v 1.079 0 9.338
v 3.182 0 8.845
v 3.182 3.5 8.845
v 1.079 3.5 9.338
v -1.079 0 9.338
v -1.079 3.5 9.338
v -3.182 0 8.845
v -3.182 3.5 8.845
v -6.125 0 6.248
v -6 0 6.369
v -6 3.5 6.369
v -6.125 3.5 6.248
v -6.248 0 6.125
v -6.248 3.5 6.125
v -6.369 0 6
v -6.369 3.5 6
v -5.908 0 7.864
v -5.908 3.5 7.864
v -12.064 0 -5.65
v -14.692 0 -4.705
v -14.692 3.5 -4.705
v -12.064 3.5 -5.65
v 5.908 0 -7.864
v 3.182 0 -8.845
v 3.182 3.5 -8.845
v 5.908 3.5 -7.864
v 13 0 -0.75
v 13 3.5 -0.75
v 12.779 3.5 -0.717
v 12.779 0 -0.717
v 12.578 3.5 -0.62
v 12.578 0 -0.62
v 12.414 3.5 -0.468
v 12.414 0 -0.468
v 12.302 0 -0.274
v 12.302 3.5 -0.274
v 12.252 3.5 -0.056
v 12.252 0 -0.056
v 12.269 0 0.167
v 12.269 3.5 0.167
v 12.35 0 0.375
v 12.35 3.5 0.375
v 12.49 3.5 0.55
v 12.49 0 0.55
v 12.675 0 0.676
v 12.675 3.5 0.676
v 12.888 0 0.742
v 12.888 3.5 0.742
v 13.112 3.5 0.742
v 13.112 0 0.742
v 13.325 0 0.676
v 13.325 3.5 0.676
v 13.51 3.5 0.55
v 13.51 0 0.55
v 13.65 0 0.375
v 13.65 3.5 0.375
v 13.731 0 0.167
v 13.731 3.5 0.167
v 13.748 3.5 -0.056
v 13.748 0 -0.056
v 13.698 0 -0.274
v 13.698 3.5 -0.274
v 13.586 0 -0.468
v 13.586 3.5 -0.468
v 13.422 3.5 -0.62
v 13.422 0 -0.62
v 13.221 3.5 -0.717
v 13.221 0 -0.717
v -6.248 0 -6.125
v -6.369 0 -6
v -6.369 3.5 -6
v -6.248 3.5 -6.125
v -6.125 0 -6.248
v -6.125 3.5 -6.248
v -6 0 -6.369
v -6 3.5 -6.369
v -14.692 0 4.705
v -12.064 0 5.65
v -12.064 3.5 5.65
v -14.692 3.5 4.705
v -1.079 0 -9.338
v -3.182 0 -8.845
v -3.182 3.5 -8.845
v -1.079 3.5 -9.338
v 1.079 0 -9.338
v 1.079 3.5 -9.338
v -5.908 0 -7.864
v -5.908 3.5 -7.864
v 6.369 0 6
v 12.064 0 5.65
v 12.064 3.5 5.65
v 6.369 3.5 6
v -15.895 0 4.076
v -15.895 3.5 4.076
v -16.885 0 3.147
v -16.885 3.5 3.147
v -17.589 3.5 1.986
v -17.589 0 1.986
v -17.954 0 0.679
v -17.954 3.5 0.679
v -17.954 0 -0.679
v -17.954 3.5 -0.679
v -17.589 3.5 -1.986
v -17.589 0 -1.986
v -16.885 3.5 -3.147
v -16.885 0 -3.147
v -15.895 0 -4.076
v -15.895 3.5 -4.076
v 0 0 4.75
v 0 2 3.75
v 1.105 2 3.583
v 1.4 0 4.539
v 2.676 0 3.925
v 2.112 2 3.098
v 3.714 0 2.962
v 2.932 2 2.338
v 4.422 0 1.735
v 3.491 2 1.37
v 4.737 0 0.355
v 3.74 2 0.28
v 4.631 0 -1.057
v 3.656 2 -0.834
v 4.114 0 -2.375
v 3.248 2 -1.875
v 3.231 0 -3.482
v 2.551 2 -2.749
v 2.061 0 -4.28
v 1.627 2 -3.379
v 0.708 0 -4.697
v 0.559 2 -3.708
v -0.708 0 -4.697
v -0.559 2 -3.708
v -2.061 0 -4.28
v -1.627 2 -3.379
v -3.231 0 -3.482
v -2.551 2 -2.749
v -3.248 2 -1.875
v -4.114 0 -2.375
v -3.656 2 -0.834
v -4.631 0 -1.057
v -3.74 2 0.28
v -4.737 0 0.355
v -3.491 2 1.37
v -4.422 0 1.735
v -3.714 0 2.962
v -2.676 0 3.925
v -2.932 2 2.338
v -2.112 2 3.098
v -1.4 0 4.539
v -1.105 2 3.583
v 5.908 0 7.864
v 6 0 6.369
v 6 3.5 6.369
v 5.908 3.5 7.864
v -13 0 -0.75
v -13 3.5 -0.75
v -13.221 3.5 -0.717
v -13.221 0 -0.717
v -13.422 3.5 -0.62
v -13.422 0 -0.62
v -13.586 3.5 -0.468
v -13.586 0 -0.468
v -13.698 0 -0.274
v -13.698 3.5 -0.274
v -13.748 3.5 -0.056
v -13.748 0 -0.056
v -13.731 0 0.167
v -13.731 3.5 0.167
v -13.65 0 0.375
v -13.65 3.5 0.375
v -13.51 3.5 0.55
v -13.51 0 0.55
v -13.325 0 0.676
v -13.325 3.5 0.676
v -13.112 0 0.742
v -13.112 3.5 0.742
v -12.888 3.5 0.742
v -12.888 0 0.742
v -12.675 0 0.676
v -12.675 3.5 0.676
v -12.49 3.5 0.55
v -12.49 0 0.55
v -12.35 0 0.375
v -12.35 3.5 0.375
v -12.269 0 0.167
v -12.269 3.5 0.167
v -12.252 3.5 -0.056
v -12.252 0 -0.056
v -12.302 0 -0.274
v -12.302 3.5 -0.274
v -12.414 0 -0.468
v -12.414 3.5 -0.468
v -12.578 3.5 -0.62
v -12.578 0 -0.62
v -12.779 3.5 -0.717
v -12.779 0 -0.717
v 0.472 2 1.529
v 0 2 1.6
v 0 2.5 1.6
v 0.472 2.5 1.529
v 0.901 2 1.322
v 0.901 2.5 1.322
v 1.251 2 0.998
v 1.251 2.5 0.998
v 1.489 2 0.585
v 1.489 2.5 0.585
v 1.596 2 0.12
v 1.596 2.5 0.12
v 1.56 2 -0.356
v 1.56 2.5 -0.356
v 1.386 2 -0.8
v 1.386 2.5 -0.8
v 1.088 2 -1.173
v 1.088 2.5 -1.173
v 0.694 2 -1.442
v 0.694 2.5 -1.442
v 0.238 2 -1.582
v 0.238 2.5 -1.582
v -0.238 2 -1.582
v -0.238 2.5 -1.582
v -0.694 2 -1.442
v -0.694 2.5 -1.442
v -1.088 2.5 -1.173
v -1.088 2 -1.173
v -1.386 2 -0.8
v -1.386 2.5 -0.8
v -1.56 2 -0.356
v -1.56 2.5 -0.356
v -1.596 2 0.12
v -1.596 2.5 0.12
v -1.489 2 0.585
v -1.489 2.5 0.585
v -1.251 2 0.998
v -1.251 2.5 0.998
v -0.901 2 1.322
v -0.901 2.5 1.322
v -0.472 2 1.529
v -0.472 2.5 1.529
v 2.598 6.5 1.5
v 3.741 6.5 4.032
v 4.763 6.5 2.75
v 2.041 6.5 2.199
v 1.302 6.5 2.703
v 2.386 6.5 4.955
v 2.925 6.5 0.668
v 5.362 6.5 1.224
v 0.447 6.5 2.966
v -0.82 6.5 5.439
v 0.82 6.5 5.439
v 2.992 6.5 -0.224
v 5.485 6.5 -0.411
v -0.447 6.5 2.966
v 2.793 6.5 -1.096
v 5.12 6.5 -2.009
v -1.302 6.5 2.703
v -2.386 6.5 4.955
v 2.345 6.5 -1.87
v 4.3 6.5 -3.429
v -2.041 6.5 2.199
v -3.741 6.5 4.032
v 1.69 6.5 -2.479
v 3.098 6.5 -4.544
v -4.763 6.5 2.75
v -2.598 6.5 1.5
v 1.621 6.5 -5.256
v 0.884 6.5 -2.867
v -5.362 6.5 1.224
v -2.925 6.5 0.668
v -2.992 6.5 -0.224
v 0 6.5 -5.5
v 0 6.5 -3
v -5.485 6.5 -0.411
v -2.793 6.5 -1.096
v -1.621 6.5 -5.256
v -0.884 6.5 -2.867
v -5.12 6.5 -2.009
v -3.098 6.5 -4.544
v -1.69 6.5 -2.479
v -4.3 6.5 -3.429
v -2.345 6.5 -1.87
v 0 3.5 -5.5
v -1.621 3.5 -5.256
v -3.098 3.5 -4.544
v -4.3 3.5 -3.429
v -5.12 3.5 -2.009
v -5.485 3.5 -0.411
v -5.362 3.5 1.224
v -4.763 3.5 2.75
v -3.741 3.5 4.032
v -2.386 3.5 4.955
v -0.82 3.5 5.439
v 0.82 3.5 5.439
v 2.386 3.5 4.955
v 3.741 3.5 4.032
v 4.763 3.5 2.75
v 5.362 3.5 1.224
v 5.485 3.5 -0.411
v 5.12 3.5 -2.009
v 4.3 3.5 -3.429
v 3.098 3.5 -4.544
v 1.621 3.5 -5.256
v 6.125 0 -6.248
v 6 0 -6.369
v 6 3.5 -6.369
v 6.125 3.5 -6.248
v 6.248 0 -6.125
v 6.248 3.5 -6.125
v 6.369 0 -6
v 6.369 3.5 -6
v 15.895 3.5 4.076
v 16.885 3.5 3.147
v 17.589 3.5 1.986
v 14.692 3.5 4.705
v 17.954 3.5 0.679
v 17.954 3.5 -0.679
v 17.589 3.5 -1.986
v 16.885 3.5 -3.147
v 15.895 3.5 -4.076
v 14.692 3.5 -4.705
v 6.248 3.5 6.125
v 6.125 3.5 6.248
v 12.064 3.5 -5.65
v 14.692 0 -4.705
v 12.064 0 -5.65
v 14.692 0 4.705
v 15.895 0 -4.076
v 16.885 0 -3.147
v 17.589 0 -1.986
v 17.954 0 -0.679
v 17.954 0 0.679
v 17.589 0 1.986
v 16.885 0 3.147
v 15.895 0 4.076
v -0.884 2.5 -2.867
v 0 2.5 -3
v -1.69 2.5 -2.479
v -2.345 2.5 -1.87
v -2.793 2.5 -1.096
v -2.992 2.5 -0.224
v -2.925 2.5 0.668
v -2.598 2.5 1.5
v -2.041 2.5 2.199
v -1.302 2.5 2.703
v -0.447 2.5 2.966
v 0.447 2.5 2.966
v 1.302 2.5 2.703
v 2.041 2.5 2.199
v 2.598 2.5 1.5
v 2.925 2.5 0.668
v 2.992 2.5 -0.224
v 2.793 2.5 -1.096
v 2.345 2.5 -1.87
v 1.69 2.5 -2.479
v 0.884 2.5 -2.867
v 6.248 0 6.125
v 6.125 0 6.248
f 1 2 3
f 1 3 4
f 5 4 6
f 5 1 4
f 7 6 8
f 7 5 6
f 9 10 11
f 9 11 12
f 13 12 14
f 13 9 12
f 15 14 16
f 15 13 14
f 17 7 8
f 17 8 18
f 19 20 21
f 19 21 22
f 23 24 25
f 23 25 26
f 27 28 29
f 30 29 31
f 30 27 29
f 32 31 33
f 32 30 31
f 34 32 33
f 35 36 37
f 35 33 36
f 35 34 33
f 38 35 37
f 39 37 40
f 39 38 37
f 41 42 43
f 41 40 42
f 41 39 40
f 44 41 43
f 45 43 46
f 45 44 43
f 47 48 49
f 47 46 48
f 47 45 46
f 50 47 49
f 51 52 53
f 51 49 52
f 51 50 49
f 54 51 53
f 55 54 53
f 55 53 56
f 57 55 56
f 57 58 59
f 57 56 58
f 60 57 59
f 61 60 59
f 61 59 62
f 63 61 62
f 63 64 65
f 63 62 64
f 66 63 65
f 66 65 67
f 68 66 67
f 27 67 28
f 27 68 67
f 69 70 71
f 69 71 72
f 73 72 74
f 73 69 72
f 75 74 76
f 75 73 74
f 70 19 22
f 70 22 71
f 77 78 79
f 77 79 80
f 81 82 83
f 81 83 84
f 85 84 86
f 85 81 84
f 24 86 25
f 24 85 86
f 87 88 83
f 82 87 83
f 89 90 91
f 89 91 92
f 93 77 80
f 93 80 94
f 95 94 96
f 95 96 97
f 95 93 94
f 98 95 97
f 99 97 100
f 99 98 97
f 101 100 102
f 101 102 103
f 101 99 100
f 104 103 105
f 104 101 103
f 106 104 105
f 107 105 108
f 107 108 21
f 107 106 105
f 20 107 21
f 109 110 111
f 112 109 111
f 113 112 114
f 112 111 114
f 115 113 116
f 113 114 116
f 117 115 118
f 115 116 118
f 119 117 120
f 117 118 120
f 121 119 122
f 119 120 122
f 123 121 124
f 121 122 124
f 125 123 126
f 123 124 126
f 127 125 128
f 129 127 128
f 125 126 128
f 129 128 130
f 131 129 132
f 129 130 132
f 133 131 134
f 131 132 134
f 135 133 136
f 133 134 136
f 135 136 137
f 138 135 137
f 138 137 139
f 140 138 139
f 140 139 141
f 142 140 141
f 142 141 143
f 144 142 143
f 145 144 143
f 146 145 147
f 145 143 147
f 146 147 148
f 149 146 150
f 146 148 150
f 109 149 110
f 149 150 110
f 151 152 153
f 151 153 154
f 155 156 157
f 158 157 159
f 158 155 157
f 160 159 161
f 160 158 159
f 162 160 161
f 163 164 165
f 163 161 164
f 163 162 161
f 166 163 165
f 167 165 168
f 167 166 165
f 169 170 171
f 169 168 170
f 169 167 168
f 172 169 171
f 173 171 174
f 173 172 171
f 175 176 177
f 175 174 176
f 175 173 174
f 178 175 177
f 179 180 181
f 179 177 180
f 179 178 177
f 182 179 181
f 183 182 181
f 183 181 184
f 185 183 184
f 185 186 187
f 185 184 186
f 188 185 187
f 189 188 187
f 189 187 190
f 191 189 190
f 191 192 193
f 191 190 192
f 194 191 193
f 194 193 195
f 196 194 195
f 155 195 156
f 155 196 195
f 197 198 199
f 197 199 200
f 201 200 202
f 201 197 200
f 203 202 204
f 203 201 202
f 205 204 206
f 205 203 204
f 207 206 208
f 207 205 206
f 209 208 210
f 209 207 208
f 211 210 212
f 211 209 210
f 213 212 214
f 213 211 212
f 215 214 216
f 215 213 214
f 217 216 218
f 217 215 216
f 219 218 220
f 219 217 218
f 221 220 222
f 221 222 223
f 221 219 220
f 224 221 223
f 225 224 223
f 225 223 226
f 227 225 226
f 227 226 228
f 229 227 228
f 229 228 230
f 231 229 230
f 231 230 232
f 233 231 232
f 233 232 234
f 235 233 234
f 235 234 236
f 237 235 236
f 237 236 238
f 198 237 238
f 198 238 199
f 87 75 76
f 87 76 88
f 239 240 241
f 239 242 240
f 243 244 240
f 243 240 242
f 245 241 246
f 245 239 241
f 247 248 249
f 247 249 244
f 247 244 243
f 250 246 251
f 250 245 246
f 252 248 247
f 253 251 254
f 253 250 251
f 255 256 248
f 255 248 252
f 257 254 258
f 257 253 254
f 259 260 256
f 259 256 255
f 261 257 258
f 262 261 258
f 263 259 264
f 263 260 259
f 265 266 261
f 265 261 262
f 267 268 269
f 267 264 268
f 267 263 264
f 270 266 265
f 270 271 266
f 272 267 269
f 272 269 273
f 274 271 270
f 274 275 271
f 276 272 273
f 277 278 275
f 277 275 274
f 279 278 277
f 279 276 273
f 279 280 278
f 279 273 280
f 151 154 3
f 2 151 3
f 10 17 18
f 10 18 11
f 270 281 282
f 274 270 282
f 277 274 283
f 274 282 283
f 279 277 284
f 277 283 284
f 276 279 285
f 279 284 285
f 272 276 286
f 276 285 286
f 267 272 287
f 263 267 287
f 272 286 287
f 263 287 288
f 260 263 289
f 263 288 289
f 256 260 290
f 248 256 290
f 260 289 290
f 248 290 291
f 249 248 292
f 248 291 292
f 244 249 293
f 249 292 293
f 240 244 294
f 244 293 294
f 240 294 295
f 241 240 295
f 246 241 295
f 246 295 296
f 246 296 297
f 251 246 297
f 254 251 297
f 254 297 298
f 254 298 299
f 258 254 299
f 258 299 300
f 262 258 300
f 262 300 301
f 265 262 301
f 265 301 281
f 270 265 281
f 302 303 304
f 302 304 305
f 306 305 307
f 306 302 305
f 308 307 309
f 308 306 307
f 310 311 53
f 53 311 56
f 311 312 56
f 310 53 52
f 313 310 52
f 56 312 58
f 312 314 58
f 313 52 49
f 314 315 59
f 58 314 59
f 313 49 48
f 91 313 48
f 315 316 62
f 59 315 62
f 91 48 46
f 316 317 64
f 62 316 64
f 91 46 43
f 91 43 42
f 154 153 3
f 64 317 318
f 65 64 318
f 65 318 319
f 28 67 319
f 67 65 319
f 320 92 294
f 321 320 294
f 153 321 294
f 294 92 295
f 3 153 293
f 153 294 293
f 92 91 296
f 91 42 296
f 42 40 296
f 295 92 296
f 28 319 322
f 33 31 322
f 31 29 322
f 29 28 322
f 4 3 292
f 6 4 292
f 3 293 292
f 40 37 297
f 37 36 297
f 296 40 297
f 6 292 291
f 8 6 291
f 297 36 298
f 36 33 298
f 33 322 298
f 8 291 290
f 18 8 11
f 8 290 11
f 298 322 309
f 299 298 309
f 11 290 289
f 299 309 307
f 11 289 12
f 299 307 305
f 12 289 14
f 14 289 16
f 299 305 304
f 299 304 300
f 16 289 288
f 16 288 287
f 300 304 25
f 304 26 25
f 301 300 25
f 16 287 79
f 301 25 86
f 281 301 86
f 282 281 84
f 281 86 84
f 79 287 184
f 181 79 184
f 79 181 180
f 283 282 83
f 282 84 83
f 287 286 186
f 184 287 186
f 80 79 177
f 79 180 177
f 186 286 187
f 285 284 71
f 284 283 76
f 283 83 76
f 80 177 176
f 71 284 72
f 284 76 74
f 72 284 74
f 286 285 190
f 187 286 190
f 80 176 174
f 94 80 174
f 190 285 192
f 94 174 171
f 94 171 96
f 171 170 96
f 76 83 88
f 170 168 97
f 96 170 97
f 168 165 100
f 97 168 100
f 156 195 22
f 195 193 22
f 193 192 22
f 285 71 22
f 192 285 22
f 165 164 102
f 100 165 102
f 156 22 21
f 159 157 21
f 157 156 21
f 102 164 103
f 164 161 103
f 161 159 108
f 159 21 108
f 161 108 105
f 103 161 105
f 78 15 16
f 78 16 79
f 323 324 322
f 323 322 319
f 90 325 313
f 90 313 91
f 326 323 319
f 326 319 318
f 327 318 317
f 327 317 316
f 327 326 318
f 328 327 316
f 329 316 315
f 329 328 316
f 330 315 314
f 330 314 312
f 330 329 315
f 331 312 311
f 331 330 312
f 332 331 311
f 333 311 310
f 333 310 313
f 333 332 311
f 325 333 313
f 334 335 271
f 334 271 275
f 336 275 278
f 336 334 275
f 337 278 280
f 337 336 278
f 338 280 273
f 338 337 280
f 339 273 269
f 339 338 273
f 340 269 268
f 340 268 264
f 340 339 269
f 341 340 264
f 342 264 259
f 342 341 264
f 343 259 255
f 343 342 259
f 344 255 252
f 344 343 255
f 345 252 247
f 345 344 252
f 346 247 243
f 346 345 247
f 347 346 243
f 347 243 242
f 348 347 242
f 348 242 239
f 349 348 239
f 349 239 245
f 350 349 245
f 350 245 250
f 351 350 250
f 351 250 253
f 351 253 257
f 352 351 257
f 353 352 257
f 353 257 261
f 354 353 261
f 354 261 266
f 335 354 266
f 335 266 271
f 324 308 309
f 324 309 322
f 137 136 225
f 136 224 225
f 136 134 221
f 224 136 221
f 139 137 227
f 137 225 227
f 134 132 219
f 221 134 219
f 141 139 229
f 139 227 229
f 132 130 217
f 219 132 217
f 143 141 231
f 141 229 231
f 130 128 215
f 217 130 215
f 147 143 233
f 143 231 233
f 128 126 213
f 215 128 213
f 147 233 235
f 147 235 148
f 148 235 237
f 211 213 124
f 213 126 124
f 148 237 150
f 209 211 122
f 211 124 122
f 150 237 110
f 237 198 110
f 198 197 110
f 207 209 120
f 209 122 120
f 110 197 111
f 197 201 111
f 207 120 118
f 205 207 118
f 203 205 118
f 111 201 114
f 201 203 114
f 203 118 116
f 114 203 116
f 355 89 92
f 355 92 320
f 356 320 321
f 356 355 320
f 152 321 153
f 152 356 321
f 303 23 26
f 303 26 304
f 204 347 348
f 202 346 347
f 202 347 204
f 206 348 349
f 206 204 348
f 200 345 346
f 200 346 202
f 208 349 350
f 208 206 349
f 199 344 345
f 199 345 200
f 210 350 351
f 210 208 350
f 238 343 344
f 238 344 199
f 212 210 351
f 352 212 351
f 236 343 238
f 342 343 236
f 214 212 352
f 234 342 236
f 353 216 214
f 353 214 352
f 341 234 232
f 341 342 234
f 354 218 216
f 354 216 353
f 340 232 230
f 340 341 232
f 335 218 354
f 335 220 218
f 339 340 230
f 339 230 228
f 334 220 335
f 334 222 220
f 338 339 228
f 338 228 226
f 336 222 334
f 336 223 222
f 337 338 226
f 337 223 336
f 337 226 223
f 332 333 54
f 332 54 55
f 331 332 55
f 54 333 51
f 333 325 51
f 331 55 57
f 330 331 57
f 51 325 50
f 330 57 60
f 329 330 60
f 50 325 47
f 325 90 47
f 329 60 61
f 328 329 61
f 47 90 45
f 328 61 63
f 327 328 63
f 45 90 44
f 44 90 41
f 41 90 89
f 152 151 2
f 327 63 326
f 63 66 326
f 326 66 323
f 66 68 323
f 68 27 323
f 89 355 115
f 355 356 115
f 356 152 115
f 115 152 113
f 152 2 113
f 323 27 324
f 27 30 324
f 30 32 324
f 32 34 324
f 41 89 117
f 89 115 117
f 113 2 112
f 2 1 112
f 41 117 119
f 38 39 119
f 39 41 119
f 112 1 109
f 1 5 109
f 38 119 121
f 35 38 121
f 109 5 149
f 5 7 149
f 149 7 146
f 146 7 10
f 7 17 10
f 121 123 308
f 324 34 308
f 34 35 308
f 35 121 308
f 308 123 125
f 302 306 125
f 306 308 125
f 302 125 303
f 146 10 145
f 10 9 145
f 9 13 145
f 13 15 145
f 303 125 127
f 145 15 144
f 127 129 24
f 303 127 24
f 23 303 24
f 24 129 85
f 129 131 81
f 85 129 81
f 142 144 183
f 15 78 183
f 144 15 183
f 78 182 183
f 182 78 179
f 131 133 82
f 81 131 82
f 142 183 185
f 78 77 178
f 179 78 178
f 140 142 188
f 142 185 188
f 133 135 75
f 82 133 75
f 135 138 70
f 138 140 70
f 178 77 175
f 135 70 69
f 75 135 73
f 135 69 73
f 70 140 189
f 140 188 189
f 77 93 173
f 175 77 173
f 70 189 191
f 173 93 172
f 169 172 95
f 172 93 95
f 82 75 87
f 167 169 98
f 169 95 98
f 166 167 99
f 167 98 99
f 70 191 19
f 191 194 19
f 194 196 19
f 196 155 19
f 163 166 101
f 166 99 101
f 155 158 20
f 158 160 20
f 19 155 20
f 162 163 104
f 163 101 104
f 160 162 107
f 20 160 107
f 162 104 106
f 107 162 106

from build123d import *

# Parameters (mm, degrees)
SKETCH1_R           = 5.5
SKETCH1_R_2         = 3
BOSS_EXTRUDE1_DEPTH = 6.5
SKETCH2_R           = 3
BOSS_EXTRUDE2_DEPTH = 3.5
SKETCH4_R           = 3
SKETCH4_R_2         = 1.6
BOSS_EXTRUDE3_DEPTH = 2.5
SKETCH3_R           = 3.75
CUT_EXTRUDE2_DEPTH  = 2
CHAMFER1_SIZE2      = 2
CHAMFER1_SIZE       = 1
SKETCH5_R           = 0.75
CUT_EXTRUDE4_DEPTH  = 40.430318284
SKETCH6_OUTSIDE_W   = 72.61
SKETCH6_OUTSIDE_H   = 72.61
CUT_EXTRUDE5_DEPTH  = 40.430318284


with BuildPart() as part:
    # Sketch1 → Boss-Extrude1 (new body)
    with BuildSketch(Plane(origin=(0, 0, 0), x_dir=(1, 0, 0), z_dir=(0, 1, 0))):
        with Locations(Location((0, 0, 0), (0, 0, 90))):
            Circle(SKETCH1_R)
        with Locations(Location((0, 0, 0), (0, 0, 90))):
            Circle(SKETCH1_R_2, mode=Mode.SUBTRACT)
    extrude(amount=BOSS_EXTRUDE1_DEPTH)

    # Sketch2 → Boss-Extrude2 (add)
    with BuildSketch(Plane(origin=(0, 0, 0), x_dir=(1, 0, 0), z_dir=(0, 1, 0))):
        with BuildLine():
            Line((-6, 6.368869601), (-4.990599203, 22.806463037))
            ThreePointArc((-4.990599203, 22.806463037), (0, 27.5), (4.990599203, 22.806463037))
            Line((4.990599203, 22.806463037), (6, 6.368869601))
            ThreePointArc((6, 6.368869601), (6.187184335, 6.187184335), (6.368869601, 6))
            Line((6.368869601, 6), (22.806463037, 4.990599203))
            ThreePointArc((22.806463037, 4.990599203), (27.5, 0), (22.806463037, -4.990599203))
            Line((22.806463037, -4.990599203), (6.368869601, -6))
            ThreePointArc((6.368869601, -6), (6.187184335, -6.187184335), (6, -6.368869601))
            Line((6, -6.368869601), (4.990599203, -22.806463037))
            ThreePointArc((4.990599203, -22.806463037), (0, -27.5), (-4.990599203, -22.806463037))
            Line((-4.990599203, -22.806463037), (-6, -6.368869601))
            ThreePointArc((-6, -6.368869601), (-6.187184335, -6.187184335), (-6.368869601, -6))
            Line((-6.368869601, -6), (-22.806463037, -4.990599203))
            ThreePointArc((-22.806463037, -4.990599203), (-27.5, 0), (-22.806463037, 4.990599203))
            Line((-22.806463037, 4.990599203), (-6.368869601, 6))
            ThreePointArc((-6.368869601, 6), (-6.187184335, 6.187184335), (-6, 6.368869601))
        make_face()
        with Locations(Location((0, 0, 0), (0, 0, 90))):
            Circle(SKETCH2_R, mode=Mode.SUBTRACT)
    extrude(amount=BOSS_EXTRUDE2_DEPTH)

    # Sketch4 → Boss-Extrude3 (add)
    with BuildSketch(Plane(origin=(0, 0, 0), x_dir=(1, 0, 0), z_dir=(0, 1, 0))):
        with Locations(Location((0, 0, 0), (0, 0, 90))):
            Circle(SKETCH4_R)
        with Locations(Location((0, 0, 0), (0, 0, 270))):
            Circle(SKETCH4_R_2, mode=Mode.SUBTRACT)
    extrude(amount=BOSS_EXTRUDE3_DEPTH)

    # Sketch3 → Cut-Extrude2 (cut)
    with BuildSketch(Plane(origin=(0, 0, 0), x_dir=(1, 0, 0), z_dir=(0, 1, 0))):
        with Locations(Location((0, 0, 0), (0, 0, 270))):
            Circle(SKETCH3_R)
    extrude(amount=CUT_EXTRUDE2_DEPTH, mode=Mode.SUBTRACT)

    # Chamfer1
    chamfer1_edges = [part.edges().sort_by_distance(p)[0] for p in [
        (0, 0, -3.75),
    ]]
    chamfer1_side = [part.faces().sort_by_distance(p)[0] for p in [
        (0, 0, -3.77),
    ]]
    chamfer(chamfer1_edges, length=CHAMFER1_SIZE - 0.0001, length2=CHAMFER1_SIZE2 - 0.0001, reference=chamfer1_side[0])  # a hair under: the kernel refuses the full size

    # Sketch5 → Cut-Extrude4 (cut, through all)
    with BuildSketch(Plane(origin=(0, 0, 0), x_dir=(1, 0, 0), z_dir=(0, 1, 0))):
        with Locations(Location((0, 15, 0), (0, 0, 90))):
            Circle(SKETCH5_R)
        with Locations(Location((0, 21, 0), (0, 0, 90))):
            Circle(SKETCH5_R)
        with Locations(Location((13, 0, 0), (0, 0, 90))):
            Circle(SKETCH5_R)
        with Locations(Location((19, 0, 0), (0, 0, 90))):
            Circle(SKETCH5_R)
        with Locations(Location((25, 0, 0), (0, 0, 90))):
            Circle(SKETCH5_R)
        with Locations(Location((0, -21, 0), (0, 0, 90))):
            Circle(SKETCH5_R)
        with Locations(Location((0, -15, 0), (0, 0, 90))):
            Circle(SKETCH5_R)
        with Locations(Location((-13, 0, 0), (0, 0, 90))):
            Circle(SKETCH5_R)
        with Locations(Location((-19, 0, 0), (0, 0, 90))):
            Circle(SKETCH5_R)
        with Locations(Location((-25, 0, 0), (0, 0, 90))):
            Circle(SKETCH5_R)
    extrude(amount=CUT_EXTRUDE4_DEPTH, mode=Mode.SUBTRACT)

    # Sketch6 outside → Cut-Extrude5 (cut, through all)
    with BuildSketch(Plane.XZ):
        Rectangle(SKETCH6_OUTSIDE_W, SKETCH6_OUTSIDE_H)
        with BuildLine():
            Line((3.181538462, -8.845214131), (14.692307692, -4.704901133))
            ThreePointArc((14.692307692, -4.704901133), (18, 0), (14.692307692, 4.704901133))
            Line((14.692307692, 4.704901133), (3.181538462, 8.845214131))
            ThreePointArc((3.181538462, 8.845214131), (0, 9.4), (-3.181538462, 8.845214131))
            Line((-3.181538462, 8.845214131), (-14.692307692, 4.704901133))
            ThreePointArc((-14.692307692, 4.704901133), (-18, 0), (-14.692307692, -4.704901133))
            Line((-14.692307692, -4.704901133), (-3.181538462, -8.845214131))
            ThreePointArc((-3.181538462, -8.845214131), (0, -9.4), (3.181538462, -8.845214131))
        make_face(mode=Mode.SUBTRACT)
    extrude(amount=-CUT_EXTRUDE5_DEPTH, mode=Mode.SUBTRACT)


solid = part.part
